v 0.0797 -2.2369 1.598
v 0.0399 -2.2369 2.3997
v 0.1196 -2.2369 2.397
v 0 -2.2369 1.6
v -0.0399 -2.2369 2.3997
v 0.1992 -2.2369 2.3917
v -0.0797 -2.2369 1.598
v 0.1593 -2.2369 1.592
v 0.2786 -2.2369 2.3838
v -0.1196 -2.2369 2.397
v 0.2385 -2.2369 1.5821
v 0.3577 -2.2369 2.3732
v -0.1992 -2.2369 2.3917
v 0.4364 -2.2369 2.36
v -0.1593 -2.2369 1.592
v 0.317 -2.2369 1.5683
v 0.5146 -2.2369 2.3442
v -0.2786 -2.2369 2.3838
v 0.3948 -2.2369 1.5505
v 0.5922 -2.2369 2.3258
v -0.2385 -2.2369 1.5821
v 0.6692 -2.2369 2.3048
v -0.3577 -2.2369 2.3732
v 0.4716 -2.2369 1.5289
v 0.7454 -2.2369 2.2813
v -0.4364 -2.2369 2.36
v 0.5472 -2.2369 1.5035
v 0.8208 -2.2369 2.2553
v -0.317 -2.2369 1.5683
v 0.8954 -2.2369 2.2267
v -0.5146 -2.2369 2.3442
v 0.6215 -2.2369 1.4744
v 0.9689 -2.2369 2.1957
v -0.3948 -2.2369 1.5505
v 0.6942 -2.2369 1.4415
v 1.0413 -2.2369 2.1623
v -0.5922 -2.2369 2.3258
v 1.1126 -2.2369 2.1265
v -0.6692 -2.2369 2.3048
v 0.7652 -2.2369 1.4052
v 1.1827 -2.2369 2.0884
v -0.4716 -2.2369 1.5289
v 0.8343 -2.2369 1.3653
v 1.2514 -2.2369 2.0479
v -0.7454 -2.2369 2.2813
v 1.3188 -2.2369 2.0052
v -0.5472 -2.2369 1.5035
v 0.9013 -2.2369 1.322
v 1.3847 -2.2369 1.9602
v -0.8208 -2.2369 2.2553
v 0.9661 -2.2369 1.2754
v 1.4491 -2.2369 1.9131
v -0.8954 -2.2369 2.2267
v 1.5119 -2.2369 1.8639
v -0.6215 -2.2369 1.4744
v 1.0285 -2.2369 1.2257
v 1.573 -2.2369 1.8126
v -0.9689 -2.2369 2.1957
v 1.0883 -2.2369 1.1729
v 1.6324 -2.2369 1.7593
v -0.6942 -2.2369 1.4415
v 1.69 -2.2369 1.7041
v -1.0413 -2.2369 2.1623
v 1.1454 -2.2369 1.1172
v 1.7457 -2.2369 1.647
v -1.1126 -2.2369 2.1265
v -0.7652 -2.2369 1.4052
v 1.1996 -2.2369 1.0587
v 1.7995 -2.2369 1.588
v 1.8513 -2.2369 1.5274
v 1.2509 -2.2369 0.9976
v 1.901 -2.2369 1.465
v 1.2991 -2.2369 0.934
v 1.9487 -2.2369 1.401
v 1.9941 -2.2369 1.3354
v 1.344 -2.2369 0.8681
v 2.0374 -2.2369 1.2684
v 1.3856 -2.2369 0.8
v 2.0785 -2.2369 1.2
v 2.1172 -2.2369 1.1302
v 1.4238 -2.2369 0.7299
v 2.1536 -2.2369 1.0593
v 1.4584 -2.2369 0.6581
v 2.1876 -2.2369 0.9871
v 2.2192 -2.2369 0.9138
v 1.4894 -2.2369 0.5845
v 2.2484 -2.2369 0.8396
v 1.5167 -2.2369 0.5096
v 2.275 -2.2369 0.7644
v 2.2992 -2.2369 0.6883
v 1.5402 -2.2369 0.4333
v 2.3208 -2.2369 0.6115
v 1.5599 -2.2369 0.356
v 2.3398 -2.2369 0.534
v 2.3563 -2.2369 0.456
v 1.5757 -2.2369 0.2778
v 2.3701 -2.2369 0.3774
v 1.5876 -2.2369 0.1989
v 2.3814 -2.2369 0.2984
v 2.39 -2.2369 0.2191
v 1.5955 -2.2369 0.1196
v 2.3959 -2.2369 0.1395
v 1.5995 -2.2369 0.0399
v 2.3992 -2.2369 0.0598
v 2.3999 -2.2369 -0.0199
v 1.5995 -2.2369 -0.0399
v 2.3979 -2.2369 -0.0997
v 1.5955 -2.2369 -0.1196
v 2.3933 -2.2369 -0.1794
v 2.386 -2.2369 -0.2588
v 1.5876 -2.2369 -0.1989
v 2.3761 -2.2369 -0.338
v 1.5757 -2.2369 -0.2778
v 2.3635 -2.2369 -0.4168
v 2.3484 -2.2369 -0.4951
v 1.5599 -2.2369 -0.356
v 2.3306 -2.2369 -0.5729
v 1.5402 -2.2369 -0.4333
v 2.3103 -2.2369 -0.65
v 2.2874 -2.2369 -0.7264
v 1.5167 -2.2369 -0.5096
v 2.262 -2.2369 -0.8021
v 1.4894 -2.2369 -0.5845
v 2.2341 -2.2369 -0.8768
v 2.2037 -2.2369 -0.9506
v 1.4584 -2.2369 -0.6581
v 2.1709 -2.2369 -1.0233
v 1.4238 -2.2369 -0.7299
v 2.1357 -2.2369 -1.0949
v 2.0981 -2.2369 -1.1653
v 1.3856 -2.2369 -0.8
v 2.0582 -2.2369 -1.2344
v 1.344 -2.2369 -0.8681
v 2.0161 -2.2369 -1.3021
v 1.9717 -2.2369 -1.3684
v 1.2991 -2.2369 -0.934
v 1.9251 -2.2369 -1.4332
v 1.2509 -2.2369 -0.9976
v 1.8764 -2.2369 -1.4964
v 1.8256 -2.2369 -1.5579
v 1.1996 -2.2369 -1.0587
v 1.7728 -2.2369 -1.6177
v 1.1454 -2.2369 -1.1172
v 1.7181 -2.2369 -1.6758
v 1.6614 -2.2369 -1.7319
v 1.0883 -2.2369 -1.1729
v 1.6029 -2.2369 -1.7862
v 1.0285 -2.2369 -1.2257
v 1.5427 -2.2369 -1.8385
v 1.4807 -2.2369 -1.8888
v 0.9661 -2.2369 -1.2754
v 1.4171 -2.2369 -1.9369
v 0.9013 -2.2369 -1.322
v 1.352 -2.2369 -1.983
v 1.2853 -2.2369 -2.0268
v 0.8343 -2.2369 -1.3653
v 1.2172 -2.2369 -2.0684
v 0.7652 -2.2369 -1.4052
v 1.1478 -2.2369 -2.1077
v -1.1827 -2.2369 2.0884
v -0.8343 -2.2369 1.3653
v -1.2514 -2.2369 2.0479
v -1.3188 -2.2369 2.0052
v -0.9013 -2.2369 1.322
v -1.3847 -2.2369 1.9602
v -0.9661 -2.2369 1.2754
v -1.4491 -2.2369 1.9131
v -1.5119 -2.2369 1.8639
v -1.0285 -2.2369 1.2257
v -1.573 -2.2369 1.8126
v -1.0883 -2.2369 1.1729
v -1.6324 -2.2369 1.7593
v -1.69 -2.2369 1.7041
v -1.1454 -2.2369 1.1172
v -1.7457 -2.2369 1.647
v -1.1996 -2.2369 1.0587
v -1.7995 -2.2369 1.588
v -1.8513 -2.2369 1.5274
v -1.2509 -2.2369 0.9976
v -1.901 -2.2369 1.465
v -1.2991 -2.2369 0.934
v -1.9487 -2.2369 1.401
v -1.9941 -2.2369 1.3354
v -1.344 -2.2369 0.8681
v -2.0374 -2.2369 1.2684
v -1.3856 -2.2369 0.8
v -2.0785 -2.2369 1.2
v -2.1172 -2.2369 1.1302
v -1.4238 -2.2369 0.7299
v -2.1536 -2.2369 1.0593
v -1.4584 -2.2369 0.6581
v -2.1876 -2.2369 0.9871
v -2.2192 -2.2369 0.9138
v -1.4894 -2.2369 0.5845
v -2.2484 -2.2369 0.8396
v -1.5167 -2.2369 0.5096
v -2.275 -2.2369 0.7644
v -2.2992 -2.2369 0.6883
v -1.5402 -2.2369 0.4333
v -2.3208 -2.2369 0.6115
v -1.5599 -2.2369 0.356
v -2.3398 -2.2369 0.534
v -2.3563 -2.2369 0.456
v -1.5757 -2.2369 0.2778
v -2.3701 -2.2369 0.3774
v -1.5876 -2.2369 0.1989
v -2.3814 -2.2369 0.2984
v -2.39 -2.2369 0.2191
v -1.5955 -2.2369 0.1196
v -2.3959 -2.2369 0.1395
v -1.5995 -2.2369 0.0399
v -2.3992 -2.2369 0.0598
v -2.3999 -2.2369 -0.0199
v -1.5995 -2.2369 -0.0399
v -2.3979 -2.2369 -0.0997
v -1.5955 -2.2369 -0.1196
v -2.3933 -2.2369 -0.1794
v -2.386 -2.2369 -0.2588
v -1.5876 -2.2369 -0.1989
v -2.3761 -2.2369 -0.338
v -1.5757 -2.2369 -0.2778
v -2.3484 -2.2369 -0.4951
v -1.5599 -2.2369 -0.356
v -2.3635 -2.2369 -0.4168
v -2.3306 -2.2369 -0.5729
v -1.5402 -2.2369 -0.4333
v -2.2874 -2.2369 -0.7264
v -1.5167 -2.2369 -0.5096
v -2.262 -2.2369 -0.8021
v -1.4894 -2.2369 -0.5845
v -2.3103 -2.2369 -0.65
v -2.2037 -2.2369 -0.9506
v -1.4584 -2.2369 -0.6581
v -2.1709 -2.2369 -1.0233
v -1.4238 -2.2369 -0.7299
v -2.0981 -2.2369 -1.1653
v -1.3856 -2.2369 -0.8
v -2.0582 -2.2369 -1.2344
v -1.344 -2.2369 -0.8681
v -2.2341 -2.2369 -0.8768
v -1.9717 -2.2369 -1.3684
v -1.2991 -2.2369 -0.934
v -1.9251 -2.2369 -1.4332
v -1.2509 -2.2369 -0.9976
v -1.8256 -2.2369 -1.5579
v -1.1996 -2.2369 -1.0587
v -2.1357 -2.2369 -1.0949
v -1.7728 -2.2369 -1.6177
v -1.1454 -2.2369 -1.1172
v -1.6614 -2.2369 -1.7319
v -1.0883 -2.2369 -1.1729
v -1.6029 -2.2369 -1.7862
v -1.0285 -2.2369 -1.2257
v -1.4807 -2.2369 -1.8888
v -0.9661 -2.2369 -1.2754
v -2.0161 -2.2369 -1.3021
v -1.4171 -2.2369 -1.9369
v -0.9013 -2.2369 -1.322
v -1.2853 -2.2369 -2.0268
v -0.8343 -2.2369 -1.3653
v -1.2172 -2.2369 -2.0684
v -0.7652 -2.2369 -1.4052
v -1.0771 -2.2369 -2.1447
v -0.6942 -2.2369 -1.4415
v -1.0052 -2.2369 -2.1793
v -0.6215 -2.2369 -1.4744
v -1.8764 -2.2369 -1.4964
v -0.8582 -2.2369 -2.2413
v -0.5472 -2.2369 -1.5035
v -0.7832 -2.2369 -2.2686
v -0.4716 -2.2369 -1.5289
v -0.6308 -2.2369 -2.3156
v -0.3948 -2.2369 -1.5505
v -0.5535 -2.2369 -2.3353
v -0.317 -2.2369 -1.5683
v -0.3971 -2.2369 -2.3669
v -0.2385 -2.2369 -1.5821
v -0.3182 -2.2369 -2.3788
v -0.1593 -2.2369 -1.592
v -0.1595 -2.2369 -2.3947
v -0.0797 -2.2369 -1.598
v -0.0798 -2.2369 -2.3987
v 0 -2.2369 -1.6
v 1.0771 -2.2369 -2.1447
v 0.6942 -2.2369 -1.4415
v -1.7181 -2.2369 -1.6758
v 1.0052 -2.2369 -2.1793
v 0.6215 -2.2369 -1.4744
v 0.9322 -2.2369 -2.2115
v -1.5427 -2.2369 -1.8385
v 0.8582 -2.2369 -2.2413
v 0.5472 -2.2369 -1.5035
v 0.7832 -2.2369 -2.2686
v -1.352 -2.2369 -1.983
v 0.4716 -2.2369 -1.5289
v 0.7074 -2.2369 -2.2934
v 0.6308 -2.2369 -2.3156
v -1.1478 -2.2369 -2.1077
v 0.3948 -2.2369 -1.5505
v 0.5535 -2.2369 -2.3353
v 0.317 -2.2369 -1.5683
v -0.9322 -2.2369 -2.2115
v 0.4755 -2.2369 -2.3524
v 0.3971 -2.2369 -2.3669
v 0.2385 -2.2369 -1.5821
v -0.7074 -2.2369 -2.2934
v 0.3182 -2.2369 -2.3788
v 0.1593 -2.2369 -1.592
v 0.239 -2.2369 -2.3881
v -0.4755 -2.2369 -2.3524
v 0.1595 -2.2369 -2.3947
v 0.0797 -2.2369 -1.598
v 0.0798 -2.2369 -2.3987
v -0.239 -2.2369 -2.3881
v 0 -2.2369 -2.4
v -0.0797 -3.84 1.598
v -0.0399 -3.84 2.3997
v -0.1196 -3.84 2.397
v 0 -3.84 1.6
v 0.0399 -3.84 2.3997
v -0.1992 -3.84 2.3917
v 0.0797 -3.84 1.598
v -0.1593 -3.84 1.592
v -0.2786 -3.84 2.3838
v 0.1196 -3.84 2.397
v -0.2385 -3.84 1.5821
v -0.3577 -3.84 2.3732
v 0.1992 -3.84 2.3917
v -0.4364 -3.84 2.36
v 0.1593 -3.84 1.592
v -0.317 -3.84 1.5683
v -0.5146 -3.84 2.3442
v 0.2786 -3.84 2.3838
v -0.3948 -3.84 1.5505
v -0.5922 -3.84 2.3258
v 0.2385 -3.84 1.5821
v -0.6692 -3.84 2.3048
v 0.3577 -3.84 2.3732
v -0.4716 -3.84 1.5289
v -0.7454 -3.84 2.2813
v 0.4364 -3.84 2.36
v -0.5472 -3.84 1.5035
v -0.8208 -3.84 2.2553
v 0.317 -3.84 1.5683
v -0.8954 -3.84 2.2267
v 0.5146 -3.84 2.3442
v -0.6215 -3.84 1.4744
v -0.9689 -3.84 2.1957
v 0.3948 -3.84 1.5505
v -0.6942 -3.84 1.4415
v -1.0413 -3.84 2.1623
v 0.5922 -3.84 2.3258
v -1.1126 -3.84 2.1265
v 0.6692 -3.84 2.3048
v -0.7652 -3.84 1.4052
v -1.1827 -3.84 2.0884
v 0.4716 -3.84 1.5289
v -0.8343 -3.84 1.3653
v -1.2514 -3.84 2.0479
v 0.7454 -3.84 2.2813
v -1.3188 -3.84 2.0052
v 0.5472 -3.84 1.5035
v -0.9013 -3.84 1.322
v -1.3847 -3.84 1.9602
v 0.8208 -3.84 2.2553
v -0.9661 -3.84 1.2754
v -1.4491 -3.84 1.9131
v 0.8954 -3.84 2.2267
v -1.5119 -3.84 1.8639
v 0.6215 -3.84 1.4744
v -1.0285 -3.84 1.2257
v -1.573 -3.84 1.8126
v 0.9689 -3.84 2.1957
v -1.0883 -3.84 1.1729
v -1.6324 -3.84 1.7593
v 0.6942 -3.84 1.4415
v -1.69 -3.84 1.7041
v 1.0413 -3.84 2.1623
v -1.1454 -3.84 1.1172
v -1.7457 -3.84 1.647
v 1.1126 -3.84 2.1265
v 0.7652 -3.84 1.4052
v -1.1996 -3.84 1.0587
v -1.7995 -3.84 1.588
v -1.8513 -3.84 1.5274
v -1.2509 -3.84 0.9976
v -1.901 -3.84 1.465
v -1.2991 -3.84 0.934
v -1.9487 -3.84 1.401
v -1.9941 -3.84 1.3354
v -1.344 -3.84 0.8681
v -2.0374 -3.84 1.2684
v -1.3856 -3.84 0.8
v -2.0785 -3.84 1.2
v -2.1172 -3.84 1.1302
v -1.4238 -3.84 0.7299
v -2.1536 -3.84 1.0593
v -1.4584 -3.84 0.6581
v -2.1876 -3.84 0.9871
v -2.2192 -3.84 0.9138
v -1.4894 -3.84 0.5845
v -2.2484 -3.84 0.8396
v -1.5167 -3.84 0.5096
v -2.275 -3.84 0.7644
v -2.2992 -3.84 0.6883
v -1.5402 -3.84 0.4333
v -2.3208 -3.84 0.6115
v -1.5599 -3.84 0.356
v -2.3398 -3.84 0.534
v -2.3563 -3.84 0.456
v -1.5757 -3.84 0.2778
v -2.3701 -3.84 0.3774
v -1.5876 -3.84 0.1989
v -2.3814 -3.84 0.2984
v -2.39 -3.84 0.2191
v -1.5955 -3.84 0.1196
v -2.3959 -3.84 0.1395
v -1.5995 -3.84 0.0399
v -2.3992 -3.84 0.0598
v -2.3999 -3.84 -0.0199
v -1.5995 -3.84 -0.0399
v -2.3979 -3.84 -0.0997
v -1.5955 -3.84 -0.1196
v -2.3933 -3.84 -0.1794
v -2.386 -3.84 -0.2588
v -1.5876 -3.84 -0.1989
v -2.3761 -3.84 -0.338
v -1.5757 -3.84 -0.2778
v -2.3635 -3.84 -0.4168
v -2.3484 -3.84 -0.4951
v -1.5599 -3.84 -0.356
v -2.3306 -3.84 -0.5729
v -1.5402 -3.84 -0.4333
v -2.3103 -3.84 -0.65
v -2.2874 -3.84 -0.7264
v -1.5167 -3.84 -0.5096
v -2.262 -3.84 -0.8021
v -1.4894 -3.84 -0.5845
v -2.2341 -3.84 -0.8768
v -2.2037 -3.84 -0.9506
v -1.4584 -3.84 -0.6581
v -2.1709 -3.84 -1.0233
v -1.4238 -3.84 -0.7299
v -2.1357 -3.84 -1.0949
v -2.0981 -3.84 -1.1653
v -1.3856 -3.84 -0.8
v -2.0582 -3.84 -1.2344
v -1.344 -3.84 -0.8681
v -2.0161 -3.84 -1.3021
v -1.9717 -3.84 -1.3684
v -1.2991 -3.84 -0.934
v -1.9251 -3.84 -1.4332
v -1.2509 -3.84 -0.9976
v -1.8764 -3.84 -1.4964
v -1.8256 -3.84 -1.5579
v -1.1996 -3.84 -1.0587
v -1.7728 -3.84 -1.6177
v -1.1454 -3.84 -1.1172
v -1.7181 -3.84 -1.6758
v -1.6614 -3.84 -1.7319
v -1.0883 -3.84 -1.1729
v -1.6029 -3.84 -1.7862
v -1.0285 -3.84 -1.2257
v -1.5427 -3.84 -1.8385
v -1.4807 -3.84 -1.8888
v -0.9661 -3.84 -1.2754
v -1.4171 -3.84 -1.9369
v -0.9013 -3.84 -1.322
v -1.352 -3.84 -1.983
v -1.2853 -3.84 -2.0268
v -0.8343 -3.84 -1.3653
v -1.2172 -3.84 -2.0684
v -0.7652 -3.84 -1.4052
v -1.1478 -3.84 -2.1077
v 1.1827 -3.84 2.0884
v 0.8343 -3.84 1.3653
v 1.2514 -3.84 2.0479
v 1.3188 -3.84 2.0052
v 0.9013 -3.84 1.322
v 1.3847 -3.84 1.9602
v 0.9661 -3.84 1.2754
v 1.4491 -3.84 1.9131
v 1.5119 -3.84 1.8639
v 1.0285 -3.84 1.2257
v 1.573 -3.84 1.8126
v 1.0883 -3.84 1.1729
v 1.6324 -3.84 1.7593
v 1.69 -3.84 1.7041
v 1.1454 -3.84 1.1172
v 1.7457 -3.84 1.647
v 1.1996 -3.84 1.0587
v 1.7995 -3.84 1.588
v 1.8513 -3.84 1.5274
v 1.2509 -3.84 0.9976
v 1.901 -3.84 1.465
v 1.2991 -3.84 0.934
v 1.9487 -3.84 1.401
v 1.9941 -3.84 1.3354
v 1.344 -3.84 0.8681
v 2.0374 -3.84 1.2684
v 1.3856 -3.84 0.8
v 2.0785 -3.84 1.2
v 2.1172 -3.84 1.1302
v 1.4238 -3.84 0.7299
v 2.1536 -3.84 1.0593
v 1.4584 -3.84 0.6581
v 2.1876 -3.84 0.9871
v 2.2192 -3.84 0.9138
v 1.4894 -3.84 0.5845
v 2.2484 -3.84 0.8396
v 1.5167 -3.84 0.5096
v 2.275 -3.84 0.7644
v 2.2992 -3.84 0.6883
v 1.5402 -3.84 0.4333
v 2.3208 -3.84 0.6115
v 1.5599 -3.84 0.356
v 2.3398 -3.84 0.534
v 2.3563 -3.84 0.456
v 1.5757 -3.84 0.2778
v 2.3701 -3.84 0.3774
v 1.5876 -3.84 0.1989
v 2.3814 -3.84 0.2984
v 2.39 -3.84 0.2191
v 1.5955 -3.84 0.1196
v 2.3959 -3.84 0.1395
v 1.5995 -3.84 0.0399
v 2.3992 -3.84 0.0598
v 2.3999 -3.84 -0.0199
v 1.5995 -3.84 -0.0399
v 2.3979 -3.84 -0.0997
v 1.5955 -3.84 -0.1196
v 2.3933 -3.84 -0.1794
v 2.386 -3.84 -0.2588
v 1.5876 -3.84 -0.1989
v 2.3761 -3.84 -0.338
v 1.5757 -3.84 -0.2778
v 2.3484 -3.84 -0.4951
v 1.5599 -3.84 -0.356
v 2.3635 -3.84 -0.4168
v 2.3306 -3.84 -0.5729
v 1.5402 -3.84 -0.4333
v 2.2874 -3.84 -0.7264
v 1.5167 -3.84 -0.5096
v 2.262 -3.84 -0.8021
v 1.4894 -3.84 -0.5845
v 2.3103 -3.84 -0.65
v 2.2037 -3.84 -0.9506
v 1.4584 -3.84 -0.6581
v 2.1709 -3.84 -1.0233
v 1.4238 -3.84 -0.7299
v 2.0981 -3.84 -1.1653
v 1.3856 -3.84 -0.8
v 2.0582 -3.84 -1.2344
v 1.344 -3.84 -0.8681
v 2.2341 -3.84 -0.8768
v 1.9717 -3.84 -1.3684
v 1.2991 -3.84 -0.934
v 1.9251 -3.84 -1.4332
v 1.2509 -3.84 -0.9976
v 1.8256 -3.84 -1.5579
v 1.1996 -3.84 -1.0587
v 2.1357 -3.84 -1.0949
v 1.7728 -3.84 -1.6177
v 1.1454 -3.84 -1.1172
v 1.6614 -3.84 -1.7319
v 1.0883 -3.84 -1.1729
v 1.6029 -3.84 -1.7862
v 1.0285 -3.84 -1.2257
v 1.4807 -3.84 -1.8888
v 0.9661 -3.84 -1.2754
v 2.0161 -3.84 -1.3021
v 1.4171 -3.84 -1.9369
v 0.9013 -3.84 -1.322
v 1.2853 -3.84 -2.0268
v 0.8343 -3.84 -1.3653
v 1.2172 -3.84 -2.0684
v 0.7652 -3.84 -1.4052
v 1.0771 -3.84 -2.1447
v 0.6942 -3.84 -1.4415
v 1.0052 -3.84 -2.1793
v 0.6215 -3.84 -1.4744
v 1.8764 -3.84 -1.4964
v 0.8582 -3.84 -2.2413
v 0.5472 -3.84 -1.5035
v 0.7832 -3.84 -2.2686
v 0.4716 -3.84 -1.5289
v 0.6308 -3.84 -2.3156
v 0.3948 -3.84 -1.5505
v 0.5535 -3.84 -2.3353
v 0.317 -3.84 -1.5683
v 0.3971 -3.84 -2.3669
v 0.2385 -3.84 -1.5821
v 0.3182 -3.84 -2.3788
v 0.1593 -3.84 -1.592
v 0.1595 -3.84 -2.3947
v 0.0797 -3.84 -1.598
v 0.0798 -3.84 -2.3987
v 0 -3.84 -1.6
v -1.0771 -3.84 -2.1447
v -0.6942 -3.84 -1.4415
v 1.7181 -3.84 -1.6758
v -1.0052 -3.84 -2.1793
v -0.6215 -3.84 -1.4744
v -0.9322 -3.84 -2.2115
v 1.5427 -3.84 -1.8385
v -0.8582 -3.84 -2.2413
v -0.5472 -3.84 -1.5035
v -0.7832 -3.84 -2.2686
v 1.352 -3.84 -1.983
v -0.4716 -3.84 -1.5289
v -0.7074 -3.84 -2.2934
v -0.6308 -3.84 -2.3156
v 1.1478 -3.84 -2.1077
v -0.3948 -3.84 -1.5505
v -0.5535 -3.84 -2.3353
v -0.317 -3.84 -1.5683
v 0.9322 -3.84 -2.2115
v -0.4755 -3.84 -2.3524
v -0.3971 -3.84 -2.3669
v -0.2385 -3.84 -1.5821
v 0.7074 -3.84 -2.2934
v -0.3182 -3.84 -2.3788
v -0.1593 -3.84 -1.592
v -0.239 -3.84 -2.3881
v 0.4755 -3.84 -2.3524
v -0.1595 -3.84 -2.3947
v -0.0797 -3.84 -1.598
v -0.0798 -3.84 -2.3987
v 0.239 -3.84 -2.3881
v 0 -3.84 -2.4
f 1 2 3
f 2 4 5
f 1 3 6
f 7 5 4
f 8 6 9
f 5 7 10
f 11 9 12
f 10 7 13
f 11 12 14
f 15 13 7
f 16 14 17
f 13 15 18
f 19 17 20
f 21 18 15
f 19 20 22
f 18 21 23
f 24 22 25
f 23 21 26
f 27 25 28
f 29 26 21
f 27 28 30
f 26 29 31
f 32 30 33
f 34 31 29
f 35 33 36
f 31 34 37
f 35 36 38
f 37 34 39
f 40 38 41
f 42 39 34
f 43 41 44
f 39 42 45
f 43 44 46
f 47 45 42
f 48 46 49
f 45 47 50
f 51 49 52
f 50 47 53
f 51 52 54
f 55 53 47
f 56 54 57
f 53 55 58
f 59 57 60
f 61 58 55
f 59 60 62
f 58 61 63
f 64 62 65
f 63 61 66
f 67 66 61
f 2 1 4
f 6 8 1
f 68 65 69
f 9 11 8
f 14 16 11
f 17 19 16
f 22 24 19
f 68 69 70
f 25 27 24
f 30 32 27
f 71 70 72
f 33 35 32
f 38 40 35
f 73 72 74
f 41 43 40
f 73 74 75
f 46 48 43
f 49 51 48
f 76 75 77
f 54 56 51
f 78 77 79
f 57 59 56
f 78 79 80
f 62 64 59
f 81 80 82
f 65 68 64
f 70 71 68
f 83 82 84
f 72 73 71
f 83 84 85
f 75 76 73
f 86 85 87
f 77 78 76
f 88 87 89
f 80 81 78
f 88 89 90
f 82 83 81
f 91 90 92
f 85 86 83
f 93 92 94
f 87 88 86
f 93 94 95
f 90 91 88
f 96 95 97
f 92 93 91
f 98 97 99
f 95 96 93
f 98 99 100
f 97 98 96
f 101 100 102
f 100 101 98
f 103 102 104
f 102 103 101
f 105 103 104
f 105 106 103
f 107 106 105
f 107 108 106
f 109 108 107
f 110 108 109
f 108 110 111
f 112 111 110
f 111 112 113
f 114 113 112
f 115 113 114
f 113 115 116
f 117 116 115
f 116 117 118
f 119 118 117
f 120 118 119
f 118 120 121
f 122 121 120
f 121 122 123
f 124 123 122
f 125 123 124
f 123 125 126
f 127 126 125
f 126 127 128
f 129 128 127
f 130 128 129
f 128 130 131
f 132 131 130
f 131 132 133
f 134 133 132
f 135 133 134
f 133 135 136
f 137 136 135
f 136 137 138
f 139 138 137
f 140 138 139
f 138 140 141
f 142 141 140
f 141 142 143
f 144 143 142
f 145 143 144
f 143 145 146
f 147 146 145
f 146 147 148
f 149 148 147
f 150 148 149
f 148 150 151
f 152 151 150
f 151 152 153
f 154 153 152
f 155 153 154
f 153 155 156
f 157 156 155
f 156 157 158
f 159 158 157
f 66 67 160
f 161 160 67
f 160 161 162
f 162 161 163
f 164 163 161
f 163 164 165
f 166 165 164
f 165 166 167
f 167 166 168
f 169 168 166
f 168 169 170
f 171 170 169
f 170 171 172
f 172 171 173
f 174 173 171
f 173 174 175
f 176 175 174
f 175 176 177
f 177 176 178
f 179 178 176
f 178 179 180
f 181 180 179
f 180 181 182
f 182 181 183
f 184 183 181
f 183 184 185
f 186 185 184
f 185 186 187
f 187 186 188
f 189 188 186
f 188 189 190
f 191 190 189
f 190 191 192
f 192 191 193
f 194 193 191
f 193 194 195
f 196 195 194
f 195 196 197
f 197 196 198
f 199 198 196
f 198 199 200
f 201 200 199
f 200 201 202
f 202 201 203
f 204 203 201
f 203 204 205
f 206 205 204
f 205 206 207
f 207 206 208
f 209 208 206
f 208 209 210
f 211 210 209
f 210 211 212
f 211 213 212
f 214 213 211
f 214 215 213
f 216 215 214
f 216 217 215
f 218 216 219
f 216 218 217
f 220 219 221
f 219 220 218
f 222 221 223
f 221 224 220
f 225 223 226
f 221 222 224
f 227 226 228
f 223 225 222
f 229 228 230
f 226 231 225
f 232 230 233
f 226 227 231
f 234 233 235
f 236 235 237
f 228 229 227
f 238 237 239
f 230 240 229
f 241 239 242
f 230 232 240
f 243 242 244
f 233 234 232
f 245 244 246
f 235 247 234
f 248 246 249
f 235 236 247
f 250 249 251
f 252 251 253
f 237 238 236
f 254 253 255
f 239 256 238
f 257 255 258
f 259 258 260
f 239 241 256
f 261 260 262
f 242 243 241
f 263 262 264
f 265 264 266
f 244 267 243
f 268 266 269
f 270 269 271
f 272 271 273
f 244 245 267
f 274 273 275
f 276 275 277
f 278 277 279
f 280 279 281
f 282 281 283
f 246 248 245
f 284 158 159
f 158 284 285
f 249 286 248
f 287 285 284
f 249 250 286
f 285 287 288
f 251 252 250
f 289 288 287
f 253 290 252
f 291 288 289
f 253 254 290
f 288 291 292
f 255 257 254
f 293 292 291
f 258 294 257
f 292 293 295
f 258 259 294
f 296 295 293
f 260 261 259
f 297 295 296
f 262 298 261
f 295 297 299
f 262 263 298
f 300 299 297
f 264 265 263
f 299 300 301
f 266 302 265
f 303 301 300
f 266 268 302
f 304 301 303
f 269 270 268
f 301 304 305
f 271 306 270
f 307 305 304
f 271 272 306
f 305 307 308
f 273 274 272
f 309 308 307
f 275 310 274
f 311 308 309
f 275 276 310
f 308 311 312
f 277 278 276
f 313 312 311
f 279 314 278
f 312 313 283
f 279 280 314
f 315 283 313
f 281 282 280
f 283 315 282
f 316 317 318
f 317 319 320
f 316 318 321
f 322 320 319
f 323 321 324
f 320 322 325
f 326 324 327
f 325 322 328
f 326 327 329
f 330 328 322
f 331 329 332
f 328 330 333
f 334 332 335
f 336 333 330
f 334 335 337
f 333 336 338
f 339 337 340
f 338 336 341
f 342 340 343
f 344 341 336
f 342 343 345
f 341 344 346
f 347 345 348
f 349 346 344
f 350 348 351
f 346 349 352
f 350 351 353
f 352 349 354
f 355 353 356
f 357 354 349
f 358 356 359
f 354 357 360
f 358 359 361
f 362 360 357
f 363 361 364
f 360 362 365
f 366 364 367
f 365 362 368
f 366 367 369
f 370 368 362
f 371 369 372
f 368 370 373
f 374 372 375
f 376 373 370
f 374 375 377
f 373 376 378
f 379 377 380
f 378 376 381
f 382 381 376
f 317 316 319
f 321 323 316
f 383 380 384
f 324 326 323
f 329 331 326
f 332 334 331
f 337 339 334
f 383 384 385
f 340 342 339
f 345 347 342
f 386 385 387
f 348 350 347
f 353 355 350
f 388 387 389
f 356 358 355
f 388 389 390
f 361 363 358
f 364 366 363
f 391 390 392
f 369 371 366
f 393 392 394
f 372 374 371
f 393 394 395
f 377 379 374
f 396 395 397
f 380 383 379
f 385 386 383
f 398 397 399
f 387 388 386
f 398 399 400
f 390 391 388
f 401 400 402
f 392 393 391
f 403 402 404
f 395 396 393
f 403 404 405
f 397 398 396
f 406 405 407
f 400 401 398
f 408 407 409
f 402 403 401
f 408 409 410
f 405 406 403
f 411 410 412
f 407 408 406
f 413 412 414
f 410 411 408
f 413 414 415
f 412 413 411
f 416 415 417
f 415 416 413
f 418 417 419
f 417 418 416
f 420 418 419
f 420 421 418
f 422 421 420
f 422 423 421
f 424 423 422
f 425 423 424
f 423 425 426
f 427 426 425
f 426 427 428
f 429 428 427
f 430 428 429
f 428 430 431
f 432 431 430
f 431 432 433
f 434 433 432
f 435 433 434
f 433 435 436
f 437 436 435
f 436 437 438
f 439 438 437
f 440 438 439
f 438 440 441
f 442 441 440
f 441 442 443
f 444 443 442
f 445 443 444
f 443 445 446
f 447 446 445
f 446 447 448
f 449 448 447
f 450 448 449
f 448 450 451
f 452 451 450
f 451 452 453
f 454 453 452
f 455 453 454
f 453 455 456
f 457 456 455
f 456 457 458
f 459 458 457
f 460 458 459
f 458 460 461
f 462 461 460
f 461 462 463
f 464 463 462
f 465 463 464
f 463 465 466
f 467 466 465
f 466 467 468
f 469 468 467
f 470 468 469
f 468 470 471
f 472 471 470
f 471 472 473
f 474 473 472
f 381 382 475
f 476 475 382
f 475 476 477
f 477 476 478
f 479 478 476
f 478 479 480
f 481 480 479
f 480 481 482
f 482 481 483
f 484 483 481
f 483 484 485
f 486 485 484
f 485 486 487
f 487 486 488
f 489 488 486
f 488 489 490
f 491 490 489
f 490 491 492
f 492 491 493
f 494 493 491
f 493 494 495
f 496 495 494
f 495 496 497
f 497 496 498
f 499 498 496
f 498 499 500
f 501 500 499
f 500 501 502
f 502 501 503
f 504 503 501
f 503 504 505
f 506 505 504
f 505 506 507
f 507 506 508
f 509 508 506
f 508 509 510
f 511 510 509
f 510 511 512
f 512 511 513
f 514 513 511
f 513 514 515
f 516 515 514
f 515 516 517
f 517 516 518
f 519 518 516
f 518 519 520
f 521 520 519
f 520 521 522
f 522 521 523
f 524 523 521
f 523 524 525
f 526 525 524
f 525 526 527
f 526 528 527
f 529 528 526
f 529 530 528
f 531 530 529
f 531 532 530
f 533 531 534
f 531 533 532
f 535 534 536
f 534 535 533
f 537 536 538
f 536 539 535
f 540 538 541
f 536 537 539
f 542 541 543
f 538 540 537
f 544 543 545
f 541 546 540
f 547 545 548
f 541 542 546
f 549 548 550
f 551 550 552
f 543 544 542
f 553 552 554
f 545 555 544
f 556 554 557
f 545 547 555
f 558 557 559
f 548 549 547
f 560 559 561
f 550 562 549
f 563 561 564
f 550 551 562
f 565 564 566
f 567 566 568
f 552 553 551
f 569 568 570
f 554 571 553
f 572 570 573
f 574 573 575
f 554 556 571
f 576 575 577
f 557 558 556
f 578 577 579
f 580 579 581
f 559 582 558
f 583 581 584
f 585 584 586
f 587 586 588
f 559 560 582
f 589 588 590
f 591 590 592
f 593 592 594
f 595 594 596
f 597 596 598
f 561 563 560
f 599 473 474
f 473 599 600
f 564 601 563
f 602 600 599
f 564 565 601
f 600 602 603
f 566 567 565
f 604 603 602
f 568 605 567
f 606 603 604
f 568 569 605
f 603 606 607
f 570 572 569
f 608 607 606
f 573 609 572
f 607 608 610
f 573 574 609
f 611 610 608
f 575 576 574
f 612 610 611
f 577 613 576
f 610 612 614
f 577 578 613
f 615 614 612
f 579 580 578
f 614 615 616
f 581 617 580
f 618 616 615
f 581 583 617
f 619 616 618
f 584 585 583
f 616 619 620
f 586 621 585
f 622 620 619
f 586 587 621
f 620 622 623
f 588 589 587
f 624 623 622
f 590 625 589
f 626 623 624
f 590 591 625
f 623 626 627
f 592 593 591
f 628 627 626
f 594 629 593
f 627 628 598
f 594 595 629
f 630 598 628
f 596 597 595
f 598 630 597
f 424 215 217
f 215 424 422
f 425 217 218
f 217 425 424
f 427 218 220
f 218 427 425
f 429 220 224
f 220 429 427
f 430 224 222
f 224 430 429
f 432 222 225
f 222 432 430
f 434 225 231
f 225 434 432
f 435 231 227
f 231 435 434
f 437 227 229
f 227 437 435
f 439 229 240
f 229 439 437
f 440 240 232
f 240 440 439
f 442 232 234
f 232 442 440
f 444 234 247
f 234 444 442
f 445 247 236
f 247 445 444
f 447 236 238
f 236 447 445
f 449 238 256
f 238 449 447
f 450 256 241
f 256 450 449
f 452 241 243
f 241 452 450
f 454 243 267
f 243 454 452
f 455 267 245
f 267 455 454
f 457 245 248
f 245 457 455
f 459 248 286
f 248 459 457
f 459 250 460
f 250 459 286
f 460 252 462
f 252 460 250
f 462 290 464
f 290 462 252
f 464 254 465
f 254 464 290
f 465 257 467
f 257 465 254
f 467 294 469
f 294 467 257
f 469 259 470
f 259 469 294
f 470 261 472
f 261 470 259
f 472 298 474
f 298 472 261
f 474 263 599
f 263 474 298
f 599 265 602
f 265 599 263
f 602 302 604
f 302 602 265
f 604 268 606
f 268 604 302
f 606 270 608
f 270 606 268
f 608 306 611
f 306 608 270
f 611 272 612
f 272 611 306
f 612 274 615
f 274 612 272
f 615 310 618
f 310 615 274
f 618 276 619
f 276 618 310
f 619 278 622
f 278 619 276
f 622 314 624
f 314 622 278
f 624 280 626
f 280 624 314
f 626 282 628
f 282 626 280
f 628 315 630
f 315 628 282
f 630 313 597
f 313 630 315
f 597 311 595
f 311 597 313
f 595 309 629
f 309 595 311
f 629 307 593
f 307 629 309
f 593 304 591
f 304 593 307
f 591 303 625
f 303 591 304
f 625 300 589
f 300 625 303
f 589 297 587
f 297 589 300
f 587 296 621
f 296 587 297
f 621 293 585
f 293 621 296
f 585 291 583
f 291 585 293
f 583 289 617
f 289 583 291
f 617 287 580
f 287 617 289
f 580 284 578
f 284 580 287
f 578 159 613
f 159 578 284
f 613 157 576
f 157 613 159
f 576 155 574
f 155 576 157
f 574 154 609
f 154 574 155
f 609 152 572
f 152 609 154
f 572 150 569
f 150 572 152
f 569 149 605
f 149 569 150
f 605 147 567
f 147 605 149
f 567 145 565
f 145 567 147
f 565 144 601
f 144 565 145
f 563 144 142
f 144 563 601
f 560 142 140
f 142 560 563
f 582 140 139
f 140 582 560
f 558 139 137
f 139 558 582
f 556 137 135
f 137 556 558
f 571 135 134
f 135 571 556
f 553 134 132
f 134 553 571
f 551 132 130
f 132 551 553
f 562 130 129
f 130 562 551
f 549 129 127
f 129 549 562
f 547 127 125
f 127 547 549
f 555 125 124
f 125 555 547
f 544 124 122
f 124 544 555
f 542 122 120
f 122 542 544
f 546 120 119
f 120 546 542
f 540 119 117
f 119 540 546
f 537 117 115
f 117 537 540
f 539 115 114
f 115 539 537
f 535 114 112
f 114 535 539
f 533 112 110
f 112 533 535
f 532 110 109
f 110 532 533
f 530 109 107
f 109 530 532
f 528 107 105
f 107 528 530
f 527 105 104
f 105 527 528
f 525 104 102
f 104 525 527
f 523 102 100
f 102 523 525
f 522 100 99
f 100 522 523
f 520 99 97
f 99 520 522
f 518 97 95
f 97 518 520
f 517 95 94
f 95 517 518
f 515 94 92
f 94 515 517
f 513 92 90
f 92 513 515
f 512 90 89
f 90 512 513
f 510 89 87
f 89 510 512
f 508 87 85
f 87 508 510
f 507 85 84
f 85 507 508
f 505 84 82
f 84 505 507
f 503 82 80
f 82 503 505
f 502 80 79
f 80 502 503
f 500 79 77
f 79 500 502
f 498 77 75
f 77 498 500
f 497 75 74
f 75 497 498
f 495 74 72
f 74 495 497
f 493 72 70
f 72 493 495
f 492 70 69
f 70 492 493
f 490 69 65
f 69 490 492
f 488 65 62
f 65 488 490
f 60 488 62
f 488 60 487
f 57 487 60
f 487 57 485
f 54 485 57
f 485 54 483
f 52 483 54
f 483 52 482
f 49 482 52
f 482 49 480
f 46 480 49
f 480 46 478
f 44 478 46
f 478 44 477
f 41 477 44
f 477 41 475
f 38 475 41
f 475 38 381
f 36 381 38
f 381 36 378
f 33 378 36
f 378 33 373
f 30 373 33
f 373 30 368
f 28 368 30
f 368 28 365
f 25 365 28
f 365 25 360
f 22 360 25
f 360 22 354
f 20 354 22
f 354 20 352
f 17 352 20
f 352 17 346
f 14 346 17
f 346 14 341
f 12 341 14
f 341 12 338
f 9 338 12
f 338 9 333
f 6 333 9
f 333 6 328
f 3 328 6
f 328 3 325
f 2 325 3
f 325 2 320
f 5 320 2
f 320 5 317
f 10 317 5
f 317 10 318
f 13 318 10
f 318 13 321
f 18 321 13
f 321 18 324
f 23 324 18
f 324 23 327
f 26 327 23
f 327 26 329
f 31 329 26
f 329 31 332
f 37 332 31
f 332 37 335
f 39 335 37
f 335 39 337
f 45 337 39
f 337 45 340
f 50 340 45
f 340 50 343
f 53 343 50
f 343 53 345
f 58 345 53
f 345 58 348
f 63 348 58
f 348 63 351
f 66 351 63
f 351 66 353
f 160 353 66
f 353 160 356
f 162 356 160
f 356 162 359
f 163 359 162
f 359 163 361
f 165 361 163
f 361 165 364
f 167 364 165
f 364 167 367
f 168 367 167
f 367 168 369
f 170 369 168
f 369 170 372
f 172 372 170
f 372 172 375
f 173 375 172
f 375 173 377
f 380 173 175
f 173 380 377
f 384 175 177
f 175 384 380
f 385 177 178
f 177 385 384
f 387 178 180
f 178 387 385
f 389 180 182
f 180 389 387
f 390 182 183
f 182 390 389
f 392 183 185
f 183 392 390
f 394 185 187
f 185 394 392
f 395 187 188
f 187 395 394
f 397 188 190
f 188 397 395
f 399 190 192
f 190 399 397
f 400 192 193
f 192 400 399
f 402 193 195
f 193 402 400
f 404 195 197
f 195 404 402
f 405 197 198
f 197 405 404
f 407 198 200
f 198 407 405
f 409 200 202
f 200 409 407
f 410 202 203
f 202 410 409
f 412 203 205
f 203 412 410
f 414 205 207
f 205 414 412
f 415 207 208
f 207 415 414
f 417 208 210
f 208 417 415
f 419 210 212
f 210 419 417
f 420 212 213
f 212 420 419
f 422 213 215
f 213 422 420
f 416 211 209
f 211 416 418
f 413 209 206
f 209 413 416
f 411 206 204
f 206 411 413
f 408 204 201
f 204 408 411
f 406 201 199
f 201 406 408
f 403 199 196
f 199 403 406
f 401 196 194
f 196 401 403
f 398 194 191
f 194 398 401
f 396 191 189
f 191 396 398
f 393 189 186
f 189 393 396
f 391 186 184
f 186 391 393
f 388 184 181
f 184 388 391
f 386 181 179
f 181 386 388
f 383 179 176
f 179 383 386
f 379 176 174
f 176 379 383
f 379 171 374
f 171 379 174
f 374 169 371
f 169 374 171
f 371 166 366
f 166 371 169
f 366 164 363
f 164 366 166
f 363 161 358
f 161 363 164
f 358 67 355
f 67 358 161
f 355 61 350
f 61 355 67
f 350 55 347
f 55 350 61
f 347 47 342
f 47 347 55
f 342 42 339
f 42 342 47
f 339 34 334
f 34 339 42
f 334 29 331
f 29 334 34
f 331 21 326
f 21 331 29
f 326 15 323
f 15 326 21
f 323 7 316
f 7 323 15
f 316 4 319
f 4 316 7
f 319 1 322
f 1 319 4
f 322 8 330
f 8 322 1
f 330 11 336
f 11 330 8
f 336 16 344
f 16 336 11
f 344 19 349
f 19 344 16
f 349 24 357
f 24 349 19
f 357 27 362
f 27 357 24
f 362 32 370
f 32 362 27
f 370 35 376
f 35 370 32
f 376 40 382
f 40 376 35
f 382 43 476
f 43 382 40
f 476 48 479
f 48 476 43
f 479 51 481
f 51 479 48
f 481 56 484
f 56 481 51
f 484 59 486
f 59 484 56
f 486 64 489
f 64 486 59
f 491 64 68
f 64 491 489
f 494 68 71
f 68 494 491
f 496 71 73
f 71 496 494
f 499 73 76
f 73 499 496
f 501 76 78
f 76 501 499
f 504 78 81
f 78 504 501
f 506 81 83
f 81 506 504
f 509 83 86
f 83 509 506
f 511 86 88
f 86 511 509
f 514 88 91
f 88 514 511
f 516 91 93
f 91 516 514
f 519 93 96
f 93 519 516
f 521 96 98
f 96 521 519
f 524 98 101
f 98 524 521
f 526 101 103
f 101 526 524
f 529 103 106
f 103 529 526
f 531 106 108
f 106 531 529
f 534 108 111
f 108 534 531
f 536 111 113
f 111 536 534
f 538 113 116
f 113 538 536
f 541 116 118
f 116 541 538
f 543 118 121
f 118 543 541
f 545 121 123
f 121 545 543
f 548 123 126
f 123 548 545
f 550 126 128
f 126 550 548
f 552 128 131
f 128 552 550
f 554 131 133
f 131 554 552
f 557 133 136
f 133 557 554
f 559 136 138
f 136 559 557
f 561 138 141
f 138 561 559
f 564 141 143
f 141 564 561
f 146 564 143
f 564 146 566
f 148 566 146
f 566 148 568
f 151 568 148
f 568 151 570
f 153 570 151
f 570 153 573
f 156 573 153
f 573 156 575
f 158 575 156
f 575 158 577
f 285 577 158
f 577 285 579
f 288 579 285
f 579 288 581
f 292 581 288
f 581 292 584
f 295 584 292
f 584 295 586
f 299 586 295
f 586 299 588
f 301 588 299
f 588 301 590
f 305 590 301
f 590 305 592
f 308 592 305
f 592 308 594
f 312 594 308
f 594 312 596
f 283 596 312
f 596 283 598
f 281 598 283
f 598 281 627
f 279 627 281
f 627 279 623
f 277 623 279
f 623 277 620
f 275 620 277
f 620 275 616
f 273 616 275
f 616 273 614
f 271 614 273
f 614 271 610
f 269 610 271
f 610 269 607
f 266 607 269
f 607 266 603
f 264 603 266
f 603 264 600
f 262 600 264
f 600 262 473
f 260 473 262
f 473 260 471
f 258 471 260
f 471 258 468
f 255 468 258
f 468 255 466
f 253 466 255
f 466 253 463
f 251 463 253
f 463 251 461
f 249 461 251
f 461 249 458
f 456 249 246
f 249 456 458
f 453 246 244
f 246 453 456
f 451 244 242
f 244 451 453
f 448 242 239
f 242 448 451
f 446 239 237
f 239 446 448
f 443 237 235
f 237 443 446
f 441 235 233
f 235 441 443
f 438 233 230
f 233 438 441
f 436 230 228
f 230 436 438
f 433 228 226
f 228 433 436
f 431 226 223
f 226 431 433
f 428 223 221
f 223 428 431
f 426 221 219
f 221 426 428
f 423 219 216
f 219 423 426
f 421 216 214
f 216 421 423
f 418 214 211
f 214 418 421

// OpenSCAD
use <../lib.scad>
use <s/37383s00.scad>
use <s/37383s01.scad>
$fa=1; $fs=0.2;
function ldraw_lib__37383(realsolid=false) = [
// 0 Wheel Rim 42 x 62 with 10 Spokes and  3 Pins
// 0 Name: 37383.dat
// 0 Author: Philippe Hurbain [Philo]
// 0 !LDRAW_ORG Part UPDATE 2020-03
// 0 !LICENSE Licensed under CC BY 2.0 and CC BY 4.0 : see CAreadme.txt
// 
// 0 !HELP Tyre:
// 0 !HELP 1 256 0 0 26.4 1 0 0 0 1 0 0 0 1 23799.dat
// 0 !HELP Logo tile:
// 0 !HELP 1 16 0 0 -13.6 1 0 0 0 0 -1 0 1 0 98138pt1.dat
// 
// 0 BFC CERTIFY CCW
  [0,"BFC","CERTIFY"],
  [0,"BFC","CCW"],
// 
// 0 !KEYWORDS Bugatti, Chiron, set 42083
// 
// 0 !HISTORY 2020-12-29 [PTadmin] Official Update 2020-03
// 
// 
// 1 16 0 0 0 1 0 0 0 1 0 0 0 1 s\37383s00.dat
  [1,16,0,0,0,1,0,0,0,1,0,0,0,1, ldraw_lib__s__37383s00(realsolid)],
// 1 16 0 0 0 1 0 0 0 1 0 0 0 1 s\37383s01.dat
  [1,16,0,0,0,1,0,0,0,1,0,0,0,1, ldraw_lib__s__37383s01(realsolid)],
// 1 16 0 0 0 -1 0 0 0 1 0 0 0 1 s\37383s01.dat
  [1,16,0,0,0,-1,0,0,0,1,0,0,0,1, ldraw_lib__s__37383s01(realsolid)],
];
module ldraw_lib__37383(step=0, col=false, unit=2/5, alt=false, line=0.2, solid=!$preview)
    makepoly(ldraw_lib__37383(solid), step=step, col=col, unit=unit, alt=alt, line=line, solid=solid);
ldraw_lib__37383(line=0.2);
